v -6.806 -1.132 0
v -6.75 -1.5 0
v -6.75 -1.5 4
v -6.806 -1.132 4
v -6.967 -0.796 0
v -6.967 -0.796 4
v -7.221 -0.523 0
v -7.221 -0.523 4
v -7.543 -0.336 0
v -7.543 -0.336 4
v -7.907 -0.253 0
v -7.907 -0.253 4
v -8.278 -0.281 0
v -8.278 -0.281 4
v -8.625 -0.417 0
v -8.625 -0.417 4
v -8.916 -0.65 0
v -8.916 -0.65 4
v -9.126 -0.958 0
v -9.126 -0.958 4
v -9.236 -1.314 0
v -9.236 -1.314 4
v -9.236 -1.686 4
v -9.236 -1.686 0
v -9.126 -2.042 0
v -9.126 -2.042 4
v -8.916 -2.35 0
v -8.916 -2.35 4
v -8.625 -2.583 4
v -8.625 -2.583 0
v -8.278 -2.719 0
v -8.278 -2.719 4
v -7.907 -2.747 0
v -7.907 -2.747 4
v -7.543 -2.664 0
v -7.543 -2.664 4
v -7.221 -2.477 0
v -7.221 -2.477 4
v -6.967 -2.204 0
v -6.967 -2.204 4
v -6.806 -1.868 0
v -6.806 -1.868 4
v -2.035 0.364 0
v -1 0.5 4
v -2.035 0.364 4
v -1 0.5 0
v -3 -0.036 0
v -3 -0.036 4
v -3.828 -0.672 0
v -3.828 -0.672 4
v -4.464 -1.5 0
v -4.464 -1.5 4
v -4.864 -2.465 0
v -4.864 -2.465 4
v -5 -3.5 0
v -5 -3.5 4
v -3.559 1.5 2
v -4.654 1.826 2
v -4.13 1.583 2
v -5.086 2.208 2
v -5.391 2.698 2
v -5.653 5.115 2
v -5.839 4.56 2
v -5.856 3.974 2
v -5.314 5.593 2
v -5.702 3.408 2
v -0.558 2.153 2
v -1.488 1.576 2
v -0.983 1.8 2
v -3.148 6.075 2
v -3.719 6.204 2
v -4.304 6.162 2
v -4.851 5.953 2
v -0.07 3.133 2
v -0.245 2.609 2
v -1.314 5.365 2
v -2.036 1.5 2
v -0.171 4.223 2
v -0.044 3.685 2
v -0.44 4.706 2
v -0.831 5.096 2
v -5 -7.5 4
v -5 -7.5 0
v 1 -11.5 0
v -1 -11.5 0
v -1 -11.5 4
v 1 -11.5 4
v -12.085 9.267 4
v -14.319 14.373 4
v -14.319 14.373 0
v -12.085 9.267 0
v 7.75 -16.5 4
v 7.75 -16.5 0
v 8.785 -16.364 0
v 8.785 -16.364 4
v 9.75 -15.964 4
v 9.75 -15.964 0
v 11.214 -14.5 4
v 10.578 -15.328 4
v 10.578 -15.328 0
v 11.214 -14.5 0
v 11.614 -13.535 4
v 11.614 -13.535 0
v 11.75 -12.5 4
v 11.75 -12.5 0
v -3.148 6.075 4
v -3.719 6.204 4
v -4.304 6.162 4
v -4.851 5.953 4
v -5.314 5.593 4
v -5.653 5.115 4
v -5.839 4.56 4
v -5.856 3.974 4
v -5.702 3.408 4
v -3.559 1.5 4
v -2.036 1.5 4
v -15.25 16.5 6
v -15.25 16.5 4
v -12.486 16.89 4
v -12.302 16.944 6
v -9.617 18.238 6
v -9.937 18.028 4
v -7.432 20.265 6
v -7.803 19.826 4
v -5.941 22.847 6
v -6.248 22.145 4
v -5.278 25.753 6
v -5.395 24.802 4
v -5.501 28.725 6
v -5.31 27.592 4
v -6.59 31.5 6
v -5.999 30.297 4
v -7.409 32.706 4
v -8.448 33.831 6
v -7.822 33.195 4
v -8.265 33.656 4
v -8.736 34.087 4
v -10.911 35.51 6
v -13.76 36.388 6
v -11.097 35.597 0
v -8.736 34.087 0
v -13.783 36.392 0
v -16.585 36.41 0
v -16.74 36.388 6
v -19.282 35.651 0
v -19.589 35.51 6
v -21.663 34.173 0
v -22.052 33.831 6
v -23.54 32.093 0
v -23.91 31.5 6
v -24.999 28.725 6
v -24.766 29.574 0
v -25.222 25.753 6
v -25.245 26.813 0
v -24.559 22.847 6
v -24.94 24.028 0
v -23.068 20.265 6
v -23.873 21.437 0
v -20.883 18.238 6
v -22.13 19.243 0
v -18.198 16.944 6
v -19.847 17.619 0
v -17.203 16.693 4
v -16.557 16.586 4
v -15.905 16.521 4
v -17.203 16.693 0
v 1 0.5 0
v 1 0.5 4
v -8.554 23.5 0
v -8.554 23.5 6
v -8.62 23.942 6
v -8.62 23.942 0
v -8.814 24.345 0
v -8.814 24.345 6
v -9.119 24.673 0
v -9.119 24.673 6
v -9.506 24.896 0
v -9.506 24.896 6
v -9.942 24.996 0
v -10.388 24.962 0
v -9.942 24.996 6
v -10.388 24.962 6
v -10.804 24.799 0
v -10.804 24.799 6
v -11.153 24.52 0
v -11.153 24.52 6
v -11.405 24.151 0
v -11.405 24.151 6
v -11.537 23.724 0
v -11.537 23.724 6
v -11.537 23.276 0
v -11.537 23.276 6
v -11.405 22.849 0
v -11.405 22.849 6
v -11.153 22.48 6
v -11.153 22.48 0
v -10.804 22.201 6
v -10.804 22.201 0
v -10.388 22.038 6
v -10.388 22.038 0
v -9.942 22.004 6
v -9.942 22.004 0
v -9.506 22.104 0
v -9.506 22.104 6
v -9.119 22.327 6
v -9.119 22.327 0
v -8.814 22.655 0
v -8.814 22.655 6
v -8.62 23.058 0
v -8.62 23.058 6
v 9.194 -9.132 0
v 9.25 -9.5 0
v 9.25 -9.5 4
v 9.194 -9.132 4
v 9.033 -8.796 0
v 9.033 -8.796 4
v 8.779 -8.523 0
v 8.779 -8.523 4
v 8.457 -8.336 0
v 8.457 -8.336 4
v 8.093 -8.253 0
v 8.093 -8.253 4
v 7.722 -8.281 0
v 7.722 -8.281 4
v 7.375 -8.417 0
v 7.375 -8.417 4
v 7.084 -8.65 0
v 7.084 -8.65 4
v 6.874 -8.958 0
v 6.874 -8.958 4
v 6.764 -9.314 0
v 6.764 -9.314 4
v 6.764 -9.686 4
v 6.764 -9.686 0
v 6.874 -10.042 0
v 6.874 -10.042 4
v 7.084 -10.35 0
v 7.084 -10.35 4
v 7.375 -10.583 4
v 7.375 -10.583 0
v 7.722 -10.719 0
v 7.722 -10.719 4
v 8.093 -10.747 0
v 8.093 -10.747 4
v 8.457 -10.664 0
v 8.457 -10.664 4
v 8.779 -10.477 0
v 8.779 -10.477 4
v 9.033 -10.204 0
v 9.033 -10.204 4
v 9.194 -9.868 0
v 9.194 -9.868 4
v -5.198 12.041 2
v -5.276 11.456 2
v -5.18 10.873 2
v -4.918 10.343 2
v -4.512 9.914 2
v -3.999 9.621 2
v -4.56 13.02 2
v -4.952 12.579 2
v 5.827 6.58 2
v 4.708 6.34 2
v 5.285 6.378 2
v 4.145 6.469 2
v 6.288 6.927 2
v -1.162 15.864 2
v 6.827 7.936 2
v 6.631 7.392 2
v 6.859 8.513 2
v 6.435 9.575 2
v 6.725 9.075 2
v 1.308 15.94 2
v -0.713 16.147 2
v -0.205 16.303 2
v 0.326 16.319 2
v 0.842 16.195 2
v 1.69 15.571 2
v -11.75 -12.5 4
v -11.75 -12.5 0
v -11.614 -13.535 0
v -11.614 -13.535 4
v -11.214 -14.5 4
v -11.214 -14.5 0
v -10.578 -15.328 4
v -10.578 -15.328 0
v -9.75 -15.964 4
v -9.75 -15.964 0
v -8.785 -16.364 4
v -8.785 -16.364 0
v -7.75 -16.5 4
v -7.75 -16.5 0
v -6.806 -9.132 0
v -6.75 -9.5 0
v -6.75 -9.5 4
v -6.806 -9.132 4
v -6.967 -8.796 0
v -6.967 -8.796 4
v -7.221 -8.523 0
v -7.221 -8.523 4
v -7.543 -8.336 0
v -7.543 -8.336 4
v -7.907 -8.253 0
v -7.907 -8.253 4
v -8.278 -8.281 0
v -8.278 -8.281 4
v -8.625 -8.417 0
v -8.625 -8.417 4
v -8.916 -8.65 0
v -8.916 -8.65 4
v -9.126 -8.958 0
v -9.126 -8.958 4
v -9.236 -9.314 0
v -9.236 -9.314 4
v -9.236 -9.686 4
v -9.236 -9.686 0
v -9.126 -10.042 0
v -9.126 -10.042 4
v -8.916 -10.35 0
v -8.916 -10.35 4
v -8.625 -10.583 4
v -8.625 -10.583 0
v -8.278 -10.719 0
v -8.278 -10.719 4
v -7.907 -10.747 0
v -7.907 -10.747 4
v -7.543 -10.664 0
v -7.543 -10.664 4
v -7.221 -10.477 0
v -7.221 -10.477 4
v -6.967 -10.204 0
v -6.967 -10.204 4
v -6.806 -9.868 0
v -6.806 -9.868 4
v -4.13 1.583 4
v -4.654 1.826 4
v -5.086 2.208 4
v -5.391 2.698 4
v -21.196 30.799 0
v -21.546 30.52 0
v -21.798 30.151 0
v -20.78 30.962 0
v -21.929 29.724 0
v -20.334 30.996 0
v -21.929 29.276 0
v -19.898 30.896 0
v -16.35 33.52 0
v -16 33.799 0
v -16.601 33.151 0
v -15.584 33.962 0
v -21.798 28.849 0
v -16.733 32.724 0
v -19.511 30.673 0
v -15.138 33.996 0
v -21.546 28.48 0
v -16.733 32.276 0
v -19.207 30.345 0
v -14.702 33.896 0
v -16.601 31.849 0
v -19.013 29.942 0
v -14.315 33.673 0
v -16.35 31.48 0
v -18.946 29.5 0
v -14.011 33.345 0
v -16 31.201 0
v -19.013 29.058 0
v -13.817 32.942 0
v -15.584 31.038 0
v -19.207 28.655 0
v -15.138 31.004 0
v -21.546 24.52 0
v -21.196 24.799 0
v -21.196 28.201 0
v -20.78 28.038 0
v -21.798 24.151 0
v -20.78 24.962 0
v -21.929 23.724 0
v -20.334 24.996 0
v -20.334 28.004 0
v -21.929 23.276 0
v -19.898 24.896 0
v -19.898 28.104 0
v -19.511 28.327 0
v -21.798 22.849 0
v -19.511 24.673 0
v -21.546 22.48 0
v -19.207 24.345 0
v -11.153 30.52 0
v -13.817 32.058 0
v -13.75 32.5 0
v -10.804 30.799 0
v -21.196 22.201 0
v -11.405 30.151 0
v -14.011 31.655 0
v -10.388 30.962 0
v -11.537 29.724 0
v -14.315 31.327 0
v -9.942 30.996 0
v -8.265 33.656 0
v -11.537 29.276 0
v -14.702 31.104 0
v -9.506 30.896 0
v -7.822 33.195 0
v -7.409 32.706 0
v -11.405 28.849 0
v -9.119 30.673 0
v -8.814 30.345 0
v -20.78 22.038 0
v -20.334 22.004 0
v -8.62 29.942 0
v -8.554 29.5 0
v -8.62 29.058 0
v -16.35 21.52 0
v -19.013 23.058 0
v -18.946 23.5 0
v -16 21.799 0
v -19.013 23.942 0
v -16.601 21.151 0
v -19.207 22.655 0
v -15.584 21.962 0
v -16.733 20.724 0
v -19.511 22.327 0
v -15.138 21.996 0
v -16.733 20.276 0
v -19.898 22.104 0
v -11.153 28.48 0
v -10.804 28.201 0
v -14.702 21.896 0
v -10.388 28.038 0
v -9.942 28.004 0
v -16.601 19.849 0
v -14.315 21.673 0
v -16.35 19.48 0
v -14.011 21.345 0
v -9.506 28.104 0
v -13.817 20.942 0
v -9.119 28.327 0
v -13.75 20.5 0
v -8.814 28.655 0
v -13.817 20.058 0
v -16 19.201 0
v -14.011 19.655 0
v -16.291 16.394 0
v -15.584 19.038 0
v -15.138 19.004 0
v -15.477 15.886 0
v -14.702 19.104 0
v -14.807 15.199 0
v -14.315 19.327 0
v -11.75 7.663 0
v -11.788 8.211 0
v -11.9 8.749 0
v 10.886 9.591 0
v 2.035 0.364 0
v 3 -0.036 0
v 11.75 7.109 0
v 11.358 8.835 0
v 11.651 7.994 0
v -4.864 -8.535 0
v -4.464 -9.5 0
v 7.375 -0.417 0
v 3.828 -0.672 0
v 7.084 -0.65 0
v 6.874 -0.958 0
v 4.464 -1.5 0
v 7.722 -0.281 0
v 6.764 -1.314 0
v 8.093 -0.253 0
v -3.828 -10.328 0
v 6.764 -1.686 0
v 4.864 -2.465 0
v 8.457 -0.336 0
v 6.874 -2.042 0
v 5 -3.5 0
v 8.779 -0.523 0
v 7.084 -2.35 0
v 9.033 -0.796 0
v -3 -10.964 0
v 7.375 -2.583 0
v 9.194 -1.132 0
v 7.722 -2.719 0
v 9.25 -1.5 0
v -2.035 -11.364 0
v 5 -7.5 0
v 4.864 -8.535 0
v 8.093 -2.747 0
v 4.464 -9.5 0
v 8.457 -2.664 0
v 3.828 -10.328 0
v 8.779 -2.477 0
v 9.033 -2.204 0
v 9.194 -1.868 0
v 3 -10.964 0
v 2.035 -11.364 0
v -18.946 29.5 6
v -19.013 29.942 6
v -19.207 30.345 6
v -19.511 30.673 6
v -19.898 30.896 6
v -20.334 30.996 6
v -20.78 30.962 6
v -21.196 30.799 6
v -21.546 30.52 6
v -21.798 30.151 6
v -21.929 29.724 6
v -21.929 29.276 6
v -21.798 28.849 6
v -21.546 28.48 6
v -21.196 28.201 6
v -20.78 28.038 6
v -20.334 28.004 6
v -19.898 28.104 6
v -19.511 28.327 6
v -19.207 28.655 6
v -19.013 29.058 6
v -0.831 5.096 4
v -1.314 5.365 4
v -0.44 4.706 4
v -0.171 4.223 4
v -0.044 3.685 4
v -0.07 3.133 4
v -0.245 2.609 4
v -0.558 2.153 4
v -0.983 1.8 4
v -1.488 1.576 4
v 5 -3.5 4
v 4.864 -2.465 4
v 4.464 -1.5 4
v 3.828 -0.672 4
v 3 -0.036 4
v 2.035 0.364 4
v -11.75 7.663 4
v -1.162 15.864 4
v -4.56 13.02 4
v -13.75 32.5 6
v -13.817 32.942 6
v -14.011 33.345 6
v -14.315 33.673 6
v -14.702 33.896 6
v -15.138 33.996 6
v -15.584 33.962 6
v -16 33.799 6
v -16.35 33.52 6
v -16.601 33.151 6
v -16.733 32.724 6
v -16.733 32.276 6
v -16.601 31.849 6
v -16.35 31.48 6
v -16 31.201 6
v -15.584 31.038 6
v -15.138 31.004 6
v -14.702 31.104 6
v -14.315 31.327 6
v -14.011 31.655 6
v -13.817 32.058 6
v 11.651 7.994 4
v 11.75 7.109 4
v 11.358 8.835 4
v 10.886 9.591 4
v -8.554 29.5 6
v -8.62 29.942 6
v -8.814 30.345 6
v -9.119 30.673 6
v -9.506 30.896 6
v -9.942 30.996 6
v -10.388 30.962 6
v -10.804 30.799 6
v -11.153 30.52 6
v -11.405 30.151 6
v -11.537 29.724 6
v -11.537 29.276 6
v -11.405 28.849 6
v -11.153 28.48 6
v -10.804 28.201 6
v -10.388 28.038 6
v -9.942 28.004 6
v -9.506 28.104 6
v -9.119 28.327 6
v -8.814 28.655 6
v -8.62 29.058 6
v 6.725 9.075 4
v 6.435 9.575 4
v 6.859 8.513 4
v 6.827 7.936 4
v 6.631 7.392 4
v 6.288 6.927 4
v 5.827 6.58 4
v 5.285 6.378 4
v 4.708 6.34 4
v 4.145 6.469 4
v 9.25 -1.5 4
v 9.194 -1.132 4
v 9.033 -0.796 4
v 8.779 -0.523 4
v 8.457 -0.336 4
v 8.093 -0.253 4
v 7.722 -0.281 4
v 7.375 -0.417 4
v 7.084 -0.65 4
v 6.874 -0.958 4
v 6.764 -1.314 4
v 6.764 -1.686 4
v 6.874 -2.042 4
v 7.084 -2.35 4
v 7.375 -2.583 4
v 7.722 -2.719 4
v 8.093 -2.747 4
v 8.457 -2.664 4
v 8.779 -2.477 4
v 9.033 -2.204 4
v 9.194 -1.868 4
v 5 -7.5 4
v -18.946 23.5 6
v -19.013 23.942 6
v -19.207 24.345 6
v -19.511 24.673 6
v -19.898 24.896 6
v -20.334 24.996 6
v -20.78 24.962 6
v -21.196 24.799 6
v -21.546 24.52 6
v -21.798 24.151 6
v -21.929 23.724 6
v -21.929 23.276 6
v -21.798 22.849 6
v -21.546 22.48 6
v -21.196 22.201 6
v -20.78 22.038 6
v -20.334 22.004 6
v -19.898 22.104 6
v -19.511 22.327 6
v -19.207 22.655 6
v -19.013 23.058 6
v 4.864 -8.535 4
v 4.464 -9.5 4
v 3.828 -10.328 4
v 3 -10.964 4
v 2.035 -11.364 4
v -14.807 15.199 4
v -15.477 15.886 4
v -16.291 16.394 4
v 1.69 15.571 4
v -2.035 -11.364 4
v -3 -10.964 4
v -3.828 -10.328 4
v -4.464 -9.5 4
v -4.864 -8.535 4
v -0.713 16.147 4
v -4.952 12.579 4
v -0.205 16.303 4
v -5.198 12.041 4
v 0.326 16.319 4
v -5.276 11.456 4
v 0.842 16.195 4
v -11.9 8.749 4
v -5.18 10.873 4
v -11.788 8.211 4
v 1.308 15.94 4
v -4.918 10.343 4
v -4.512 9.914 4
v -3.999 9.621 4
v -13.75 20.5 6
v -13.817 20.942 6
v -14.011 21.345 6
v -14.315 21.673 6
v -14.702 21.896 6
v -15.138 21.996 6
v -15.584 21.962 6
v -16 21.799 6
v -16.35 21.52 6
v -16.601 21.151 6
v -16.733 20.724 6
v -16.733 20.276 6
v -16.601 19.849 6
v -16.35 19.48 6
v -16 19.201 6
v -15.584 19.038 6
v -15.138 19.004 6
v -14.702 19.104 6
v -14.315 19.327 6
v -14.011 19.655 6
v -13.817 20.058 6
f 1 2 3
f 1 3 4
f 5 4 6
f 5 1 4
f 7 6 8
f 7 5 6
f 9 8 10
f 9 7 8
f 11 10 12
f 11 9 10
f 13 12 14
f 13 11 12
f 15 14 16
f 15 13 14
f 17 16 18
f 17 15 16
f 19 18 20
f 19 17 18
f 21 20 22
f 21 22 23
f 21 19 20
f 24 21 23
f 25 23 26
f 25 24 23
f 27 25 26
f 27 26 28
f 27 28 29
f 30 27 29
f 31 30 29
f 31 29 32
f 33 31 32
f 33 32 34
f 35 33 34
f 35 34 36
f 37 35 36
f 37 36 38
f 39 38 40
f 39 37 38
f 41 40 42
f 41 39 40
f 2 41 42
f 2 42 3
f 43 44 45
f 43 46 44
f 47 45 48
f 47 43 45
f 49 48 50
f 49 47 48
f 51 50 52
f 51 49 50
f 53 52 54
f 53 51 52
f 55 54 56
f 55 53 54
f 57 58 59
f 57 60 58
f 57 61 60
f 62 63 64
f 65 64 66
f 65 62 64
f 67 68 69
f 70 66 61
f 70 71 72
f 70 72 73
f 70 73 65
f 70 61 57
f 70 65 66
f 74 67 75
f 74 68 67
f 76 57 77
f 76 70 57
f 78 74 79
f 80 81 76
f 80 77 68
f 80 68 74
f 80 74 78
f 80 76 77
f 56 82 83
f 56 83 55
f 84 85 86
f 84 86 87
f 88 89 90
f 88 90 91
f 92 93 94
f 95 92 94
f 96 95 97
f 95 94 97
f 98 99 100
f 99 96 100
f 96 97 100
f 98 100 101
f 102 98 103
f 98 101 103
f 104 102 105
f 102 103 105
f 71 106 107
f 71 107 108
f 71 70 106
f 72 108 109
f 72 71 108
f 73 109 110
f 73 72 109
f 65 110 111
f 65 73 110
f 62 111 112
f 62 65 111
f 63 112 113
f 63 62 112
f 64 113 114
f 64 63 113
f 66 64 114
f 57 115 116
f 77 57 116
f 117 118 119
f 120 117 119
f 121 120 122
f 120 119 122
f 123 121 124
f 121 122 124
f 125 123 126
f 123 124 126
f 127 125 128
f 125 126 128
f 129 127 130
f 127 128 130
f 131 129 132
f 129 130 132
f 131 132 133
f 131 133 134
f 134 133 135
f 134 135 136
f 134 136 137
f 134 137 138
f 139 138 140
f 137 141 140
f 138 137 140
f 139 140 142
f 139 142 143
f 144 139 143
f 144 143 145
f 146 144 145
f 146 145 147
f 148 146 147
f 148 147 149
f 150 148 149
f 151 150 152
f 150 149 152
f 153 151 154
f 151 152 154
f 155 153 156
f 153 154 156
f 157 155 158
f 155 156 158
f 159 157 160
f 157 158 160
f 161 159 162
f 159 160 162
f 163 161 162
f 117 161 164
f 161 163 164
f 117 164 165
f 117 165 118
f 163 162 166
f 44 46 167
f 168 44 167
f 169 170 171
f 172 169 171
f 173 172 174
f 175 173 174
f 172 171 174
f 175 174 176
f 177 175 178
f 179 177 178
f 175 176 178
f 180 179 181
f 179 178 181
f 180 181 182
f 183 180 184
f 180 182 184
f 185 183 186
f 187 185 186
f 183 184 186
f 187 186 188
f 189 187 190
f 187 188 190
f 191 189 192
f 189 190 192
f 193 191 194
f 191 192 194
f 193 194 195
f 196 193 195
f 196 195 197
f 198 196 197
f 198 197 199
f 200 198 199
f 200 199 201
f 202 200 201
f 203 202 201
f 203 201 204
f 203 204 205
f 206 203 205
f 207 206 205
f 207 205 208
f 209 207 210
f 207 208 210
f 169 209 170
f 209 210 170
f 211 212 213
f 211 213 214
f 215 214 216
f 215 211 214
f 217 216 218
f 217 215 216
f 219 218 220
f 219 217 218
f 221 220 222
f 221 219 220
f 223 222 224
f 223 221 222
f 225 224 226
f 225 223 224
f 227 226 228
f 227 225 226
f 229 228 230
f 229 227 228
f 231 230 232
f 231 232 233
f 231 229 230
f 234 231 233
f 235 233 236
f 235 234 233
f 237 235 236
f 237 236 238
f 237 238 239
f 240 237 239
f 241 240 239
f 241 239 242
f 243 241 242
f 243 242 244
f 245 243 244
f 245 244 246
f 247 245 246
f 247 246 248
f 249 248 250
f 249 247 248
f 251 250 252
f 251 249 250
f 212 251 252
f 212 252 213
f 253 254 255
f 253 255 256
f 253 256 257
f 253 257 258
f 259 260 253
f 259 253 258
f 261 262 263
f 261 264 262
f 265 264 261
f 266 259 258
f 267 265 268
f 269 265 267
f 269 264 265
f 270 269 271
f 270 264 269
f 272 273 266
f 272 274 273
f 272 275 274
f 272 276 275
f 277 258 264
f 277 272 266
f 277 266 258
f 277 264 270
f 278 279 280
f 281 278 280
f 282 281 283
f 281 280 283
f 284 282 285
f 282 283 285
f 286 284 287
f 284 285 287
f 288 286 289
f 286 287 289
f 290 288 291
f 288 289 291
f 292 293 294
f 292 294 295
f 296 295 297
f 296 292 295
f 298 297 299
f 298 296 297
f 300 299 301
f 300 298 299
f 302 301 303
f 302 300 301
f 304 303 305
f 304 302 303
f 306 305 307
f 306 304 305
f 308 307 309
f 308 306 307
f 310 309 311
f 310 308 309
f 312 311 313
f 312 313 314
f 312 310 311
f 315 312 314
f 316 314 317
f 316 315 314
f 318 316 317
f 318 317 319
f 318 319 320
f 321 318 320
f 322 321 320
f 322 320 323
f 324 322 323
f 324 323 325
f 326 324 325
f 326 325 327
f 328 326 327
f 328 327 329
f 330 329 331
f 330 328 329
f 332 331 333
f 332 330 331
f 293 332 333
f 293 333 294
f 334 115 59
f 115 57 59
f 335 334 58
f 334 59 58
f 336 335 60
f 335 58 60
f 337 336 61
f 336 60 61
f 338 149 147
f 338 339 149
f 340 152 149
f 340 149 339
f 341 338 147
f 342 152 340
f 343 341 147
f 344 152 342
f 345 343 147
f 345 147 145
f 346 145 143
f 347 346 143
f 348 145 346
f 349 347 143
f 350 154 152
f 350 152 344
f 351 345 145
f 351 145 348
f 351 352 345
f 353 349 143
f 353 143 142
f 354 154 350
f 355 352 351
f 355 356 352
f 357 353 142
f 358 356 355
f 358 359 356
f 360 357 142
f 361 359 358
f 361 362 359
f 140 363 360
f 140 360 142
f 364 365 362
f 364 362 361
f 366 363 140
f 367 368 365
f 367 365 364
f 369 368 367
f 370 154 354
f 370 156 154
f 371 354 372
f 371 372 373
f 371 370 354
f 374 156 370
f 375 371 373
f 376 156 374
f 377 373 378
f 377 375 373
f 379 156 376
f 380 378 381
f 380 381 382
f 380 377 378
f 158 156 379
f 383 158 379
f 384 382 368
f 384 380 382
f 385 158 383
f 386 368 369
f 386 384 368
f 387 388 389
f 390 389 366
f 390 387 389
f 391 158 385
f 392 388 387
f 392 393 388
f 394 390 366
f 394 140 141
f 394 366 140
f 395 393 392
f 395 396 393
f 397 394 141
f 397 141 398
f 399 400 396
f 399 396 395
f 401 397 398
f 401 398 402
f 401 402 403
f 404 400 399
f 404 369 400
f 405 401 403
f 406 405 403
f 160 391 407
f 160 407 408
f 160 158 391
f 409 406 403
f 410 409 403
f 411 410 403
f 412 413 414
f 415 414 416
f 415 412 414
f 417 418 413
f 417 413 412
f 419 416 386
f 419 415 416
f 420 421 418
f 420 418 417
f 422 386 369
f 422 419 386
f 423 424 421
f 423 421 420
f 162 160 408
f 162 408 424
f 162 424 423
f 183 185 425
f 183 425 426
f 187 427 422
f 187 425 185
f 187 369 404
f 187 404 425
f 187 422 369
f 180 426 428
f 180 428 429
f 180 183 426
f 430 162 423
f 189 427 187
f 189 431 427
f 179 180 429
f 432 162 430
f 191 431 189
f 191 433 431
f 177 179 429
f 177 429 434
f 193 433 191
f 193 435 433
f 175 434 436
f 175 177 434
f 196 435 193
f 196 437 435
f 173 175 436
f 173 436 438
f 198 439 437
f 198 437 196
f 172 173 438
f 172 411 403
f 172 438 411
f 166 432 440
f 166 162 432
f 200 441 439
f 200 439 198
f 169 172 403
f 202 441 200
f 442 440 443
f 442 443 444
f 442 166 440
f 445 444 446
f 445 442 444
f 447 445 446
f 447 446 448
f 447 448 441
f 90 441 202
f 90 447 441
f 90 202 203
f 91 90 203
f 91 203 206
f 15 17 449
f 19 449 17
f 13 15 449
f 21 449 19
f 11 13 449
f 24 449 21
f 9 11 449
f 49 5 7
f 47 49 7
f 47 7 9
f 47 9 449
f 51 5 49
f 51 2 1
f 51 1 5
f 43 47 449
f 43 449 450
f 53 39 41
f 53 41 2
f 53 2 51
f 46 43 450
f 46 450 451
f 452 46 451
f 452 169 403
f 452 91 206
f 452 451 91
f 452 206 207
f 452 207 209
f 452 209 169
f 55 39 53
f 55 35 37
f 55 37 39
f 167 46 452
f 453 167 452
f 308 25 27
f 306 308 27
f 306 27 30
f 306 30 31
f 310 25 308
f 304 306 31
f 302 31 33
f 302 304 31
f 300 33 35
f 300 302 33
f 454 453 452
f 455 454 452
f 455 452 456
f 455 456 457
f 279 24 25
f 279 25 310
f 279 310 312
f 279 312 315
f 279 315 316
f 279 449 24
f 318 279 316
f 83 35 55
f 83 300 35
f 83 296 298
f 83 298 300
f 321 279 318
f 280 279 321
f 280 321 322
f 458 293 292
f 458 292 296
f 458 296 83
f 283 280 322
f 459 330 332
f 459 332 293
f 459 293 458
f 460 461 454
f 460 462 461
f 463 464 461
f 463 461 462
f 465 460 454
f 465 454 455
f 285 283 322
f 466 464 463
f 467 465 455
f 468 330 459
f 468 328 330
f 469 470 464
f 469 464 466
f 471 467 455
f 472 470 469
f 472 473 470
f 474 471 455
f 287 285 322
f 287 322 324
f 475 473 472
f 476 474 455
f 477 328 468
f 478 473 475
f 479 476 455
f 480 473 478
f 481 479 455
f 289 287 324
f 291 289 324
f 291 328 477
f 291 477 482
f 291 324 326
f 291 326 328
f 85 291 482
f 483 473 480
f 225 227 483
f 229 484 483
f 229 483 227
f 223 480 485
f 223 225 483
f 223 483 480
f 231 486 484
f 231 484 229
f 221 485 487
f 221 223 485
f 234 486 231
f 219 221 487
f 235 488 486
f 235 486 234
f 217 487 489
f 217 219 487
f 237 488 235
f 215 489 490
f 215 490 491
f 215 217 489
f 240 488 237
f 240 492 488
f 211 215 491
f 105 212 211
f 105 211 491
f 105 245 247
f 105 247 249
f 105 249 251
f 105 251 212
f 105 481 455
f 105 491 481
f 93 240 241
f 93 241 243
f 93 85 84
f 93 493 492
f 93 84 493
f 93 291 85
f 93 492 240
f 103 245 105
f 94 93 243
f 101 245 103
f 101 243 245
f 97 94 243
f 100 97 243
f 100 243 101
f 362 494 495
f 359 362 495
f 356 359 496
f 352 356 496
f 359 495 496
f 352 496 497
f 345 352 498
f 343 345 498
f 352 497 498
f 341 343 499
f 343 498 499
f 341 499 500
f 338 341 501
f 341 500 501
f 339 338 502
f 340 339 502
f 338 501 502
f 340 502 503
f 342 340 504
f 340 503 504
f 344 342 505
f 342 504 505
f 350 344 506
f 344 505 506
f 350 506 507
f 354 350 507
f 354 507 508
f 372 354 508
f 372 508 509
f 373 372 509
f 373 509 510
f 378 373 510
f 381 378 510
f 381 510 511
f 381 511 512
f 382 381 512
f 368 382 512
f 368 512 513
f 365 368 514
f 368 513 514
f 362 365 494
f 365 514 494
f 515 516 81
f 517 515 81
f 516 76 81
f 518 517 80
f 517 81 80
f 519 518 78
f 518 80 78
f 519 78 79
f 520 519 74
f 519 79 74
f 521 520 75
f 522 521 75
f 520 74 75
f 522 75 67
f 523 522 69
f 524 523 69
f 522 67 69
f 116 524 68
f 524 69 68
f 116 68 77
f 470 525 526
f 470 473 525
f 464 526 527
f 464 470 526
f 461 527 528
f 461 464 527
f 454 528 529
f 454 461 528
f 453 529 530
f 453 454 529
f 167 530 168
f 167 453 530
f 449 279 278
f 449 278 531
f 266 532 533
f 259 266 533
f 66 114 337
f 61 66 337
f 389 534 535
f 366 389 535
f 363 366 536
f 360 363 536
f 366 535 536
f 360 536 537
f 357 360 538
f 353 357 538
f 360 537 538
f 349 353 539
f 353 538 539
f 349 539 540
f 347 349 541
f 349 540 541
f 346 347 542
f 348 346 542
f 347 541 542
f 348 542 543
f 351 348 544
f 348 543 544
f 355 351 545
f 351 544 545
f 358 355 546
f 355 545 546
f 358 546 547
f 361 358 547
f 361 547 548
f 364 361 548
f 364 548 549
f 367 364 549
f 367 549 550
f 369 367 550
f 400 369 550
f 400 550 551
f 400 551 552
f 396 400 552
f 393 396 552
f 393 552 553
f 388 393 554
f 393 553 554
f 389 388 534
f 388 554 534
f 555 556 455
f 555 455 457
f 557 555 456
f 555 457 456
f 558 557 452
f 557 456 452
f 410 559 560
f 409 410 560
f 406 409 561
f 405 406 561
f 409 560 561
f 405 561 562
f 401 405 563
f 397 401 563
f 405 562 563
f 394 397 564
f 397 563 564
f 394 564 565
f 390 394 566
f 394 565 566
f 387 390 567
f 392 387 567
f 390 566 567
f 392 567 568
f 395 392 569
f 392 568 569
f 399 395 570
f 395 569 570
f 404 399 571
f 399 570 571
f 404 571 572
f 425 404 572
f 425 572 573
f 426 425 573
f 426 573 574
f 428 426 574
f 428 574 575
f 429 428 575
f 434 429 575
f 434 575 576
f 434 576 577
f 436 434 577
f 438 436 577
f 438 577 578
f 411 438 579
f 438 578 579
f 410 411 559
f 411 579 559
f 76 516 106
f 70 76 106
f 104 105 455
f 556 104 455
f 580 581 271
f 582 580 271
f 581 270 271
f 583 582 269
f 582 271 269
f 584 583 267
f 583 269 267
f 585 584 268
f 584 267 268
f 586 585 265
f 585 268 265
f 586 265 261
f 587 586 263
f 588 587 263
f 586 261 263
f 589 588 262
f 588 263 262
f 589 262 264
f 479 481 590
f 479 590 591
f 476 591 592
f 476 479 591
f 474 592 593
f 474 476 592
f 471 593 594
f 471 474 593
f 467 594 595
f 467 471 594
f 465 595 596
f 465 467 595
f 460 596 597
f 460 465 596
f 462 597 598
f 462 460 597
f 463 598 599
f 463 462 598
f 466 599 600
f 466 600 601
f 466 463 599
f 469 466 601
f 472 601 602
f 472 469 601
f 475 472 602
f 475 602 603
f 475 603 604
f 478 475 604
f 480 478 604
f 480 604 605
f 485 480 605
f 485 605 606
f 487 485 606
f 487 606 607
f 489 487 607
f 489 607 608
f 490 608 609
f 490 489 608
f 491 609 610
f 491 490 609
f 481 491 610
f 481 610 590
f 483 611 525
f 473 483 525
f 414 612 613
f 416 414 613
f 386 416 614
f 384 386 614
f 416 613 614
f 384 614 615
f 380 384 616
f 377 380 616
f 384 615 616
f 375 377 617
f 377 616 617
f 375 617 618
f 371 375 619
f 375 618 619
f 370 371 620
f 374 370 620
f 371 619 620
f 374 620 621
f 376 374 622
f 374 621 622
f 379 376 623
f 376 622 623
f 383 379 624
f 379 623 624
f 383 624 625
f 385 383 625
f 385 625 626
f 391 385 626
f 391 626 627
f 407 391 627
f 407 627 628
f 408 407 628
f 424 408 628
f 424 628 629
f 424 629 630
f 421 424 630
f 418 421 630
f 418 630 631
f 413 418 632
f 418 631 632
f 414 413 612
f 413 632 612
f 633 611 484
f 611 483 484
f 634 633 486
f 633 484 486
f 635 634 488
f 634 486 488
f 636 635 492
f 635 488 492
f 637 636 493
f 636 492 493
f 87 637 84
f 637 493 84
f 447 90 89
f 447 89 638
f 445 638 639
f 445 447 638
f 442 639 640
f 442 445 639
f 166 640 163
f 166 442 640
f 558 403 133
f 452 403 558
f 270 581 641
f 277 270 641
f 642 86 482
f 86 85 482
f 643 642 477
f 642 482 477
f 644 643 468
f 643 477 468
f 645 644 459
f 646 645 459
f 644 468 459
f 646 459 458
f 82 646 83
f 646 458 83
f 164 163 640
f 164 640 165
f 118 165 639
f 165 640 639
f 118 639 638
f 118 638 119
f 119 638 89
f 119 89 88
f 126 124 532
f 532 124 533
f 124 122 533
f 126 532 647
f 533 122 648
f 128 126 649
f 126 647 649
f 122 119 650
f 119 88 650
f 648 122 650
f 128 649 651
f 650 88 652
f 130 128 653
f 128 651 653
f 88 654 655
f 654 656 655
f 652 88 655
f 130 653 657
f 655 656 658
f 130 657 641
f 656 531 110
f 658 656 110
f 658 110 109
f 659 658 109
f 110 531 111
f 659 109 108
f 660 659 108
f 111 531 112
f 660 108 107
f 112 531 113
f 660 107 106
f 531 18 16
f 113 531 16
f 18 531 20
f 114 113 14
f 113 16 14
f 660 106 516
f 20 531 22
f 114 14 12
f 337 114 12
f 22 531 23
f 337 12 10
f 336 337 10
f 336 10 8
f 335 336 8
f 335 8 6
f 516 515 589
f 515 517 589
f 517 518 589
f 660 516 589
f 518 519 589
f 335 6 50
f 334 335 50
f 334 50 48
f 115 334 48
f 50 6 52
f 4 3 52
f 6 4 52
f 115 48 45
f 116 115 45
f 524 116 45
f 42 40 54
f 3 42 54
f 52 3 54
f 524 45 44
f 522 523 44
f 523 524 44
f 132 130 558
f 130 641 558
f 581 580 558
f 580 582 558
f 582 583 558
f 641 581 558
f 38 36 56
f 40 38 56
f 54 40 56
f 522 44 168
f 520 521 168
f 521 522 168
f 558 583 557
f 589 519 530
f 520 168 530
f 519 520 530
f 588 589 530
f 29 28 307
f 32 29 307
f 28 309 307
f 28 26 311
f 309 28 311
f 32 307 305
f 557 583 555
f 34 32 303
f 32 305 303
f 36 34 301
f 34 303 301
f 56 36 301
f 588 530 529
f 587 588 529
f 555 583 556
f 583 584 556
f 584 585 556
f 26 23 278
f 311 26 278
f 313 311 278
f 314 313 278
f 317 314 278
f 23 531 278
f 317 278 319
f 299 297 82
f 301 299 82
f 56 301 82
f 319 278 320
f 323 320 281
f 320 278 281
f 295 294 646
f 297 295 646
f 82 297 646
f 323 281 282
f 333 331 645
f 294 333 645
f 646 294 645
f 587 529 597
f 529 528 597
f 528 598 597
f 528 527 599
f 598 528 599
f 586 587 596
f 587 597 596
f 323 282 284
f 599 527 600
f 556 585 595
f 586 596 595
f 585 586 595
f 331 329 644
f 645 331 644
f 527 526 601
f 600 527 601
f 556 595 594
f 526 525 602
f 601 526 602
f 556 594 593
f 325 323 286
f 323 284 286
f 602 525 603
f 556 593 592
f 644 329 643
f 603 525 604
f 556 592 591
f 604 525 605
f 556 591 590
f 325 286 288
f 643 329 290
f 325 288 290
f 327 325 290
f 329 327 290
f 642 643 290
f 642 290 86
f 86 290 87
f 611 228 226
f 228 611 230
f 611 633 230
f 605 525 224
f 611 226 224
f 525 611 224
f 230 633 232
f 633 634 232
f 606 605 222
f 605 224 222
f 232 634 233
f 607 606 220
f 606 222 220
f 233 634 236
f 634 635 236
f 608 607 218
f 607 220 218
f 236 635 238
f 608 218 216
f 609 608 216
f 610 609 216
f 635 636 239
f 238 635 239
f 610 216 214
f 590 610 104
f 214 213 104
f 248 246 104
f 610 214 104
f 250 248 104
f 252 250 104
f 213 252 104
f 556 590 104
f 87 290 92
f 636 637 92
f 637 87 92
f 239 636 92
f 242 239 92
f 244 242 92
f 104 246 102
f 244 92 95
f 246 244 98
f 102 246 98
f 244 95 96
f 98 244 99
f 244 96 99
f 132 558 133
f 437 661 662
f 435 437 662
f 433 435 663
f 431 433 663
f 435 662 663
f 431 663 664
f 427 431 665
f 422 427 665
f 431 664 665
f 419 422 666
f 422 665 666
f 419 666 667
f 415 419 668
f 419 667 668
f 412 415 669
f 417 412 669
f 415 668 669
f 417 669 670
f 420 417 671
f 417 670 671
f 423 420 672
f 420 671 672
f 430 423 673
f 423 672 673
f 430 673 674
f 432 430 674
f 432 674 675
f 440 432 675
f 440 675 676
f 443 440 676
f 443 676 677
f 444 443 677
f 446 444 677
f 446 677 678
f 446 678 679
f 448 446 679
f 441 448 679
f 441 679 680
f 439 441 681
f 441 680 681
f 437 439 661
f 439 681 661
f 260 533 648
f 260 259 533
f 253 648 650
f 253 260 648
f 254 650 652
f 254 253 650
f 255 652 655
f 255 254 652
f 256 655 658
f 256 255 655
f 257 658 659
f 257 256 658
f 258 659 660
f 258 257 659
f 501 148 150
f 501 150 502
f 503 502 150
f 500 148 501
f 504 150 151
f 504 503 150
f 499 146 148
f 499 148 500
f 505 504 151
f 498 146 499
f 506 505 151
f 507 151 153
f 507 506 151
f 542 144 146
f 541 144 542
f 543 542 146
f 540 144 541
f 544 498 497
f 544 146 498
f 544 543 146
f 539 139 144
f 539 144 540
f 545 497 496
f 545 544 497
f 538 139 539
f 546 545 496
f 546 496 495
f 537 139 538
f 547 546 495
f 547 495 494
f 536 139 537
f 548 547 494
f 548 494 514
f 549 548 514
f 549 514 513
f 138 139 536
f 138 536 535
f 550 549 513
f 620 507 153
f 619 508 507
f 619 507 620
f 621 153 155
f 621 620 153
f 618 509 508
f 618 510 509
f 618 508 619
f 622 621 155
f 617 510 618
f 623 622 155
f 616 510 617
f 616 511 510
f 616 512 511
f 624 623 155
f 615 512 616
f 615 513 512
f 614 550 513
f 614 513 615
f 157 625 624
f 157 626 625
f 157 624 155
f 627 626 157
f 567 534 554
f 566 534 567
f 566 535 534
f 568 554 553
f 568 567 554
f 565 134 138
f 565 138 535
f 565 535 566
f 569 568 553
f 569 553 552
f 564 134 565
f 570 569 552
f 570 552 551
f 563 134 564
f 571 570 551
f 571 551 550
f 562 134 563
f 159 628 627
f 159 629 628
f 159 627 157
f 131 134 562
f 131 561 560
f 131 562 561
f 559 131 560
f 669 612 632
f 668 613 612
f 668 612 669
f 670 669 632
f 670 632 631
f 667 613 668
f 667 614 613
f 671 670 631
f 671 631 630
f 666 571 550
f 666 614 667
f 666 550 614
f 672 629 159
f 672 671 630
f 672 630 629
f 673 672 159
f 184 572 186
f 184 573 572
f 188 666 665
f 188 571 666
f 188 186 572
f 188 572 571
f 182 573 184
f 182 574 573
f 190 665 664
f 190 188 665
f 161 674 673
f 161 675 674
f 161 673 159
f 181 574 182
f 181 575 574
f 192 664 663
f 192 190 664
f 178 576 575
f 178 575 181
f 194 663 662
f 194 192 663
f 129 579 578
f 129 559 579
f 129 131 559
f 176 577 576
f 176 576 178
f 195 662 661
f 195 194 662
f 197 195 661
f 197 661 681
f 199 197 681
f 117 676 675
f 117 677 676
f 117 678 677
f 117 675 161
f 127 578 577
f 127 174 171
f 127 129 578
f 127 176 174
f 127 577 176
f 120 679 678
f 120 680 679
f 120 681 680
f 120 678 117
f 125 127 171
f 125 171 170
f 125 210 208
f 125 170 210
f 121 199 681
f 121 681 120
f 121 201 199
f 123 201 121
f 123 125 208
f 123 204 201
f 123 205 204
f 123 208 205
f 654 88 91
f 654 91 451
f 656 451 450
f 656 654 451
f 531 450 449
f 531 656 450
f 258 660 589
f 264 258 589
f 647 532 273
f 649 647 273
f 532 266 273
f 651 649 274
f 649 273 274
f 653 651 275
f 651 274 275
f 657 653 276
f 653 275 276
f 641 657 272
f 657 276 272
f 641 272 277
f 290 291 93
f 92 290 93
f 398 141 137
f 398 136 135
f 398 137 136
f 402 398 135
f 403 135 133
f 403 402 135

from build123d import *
from build123d.topology import SkipClean

# Parameters (mm, degrees)
SKETCH_1_R          = 10
SKETCH_1_W          = 23.5
SKETCH_1_H          = 33
SKETCH_1_R_2        = 1.25
EXTRUDE_1_DEPTH     = 4
SKETCH_2_R          = 10
EXTRUDE_2_DEPTH     = 2
SKETCH_3_R          = 1.5
CUT_EXTRUDE_1_DEPTH = 6
SKETCH_4_W          = 10
SKETCH_4_H          = 12
CUT_EXTRUDE_2_DEPTH = 6
CUT_EXTRUDE_START   = -10
CUT_EXTRUDE_4_DEPTH = 10
EXTRUDE_4_DEPTH     = 4
FILLET_1_R          = 4
CUT_EXTRUDE_5_DEPTH = 2
FILLET_2_R          = 2
FILLET_3_R          = 4


with BuildPart() as part:
    # 草图1 → 凸台-拉伸1 (new body)
    # profile 1 of 3: a face of its own
    with BuildSketch(Plane.XY):
        with Locations((-15.25, 26.5)):
            Circle(SKETCH_1_R)
    # profile 2 of 3: a face of its own
    with BuildSketch(Plane.XY):
        with BuildLine():
            Line((-15.25, 16.5), (-11.75, 16.5))
            Line((-11.75, 16.5), (11.75, 16.5))
            Line((11.75, 16.5), (-8.736127865, 34.087454765))
            ThreePointArc((-8.736127865, 34.087454765), (-6.16323156, 30.675001716), (-5.25, 26.5))
            ThreePointArc((-5.25, 26.5), (-8.178932188, 19.428932188), (-15.25, 16.5))
        make_face()
    # profile 3 of 3: a face of its own
    with BuildSketch(Plane.XY):
        Rectangle(SKETCH_1_W, SKETCH_1_H)
        with Locations((-8, -1.5)):
            Circle(SKETCH_1_R_2, mode=Mode.SUBTRACT)
        with Locations((-8, -9.5)):
            Circle(SKETCH_1_R_2, mode=Mode.SUBTRACT)
        with Locations((8, -9.5)):
            Circle(SKETCH_1_R_2, mode=Mode.SUBTRACT)
        with Locations((8, -1.5)):
            Circle(SKETCH_1_R_2, mode=Mode.SUBTRACT)
    extrude(amount=EXTRUDE_1_DEPTH)

    # 草图2 → 凸台-拉伸2 (add)
    with BuildSketch(Plane.XY.offset(4)):
        with Locations(Location((-15.25, 26.5, 0), (0, 0, 270))):
            Circle(SKETCH_2_R)
    extrude(amount=EXTRUDE_2_DEPTH)

    # 草图3 → 切除-拉伸1 (cut)
    with BuildSketch(Plane.XY.offset(6)):
        with Locations((-15.25, 32.5)):
            Circle(SKETCH_3_R)
        with Locations((-10.053847577, 29.5)):
            Circle(SKETCH_3_R)
        with Locations((-10.053847577, 23.5)):
            Circle(SKETCH_3_R)
        with Locations((-15.25, 20.5)):
            Circle(SKETCH_3_R)
        with Locations((-20.446152423, 23.5)):
            Circle(SKETCH_3_R)
        with Locations((-20.446152423, 29.5)):
            Circle(SKETCH_3_R)
    extrude(amount=-CUT_EXTRUDE_1_DEPTH, mode=Mode.SUBTRACT)

    # 草图4 → 切除-拉伸2 (cut)
    with BuildSketch(Plane.XY.offset(4)):
        with Locations((0, -5.5)):
            Rectangle(SKETCH_4_W, SKETCH_4_H)
    extrude(amount=-CUT_EXTRUDE_2_DEPTH, mode=Mode.SUBTRACT)

    # 草图7 → 切除-拉伸4 (cut)
    with SkipClean():  # the faces are left unmerged after this step: merging them gives an invalid solid
        with BuildSketch(Plane.XY.offset(4).offset(CUT_EXTRUDE_START)):
            with BuildLine():
                Line((-7.408855029, 32.706161901), (11.75, 8.5))
                Line((11.75, 8.5), (11.75, 16.5))
                Line((11.75, 16.5), (-8.736127865, 34.087454765))
                ThreePointArc((-8.736127865, 34.087454765), (-8.03933973, 33.428663542), (-7.408855029, 32.706161901))
            make_face()
        extrude(amount=CUT_EXTRUDE_4_DEPTH, mode=Mode.SUBTRACT)

    # 草图8 → 凸台-拉伸4 (add)
    with SkipClean():  # the faces are left unmerged after this step: merging them gives an invalid solid
        with BuildSketch(Plane.XY.offset(4)):
            Polygon((-15.25, 16.5), (-11.75, 8.5), (-11.75, 16.5), align=None)
        extrude(amount=-EXTRUDE_4_DEPTH)

    # 圆角1
    # the kernel refuses this fillet: 4 mm, written as the material it adds along each edge
    with BuildSketch(Plane(origin=(-11.75, 8.5, 4), x_dir=(-0.4008188340197085, 0.9161573349021888, 0), z_dir=(0, 0, -1))) as fillet_1_piece_1:
        with BuildLine():
            CenterArc((FILLET_1_R * 0.209178456653, -FILLET_1_R), FILLET_1_R, 90, 23.629377731)
            Line((-FILLET_1_R * 0.191640377366, -FILLET_1_R * 0.0838426650978), (0, 0))
            Line((0, 0), (FILLET_1_R * 0.209178456653, 0))
        make_face()
    extrude(amount=4)
    with BuildSketch(Plane(origin=(-15.25, 16.5, 0), x_dir=(-0.9951749946983144, 0.09811590048106404, 0), z_dir=(0, 0, 1))) as fillet_1_piece_2:
        with BuildLine():
            CenterArc((2.354781612, 3.980699979), FILLET_1_R, 209.260063678, 55.109250376)
            Line((-1.134859069, 2.025602047), (0, 0))
            ThreePointArc((0, 0), (0.981159005, 0.048250053), (1.96231801, 0))
        make_face()
    extrude(amount=4)
    # the kernel refuses this fillet: 4 mm, written as the material it takes off along each edge
    with BuildSketch(Plane(origin=(11.75, -16.5, -10), x_dir=(0, 1, 0), z_dir=(0, 0, 1)), Plane(origin=(-11.75, -16.5, -10), x_dir=(1, 0, 0), z_dir=(0, 0, 1))) as fillet_1_2_piece_1:
        with BuildLine():
            CenterArc((FILLET_1_R, FILLET_1_R), FILLET_1_R, 180, 90)
            Line((0, FILLET_1_R), (0, 0))
            Line((0, 0), (FILLET_1_R, 0))
        make_face()
    extrude(amount=24, mode=Mode.SUBTRACT)
    with BuildSketch(Plane(origin=(11.75, 8.5, -3.478567049), x_dir=(-0.6206161901076825, 0.7841144971088245, 0), z_dir=(0, 0, 1))) as fillet_1_2_piece_2:
        with BuildLine():
            CenterArc((FILLET_1_R * 0.347856704888, FILLET_1_R), FILLET_1_R, 231.638854085, 38.361145915)
            Line((-FILLET_1_R * 0.272759485219, FILLET_1_R * 0.215885502891), (0, 0))
            Line((0, 0), (FILLET_1_R * 0.347856704888, 0))
        make_face()
    extrude(amount=10.957134098, mode=Mode.SUBTRACT)

    # 草图9 → 切除-拉伸5 (cut)
    with BuildSketch(Plane.XY.offset(4)):
        Polygon((-7.627398855, 7.809036267), (-4.867195488, 1.5), (8.671465121, 1.5), align=None)
        Polygon((-7.160168155, 10.845088414), (10.991392982, 3.818901946), (0.414449212, 17.182289942), align=None)
    extrude(amount=-CUT_EXTRUDE_5_DEPTH, mode=Mode.SUBTRACT)

    # 圆角2
    fillet_2_edges = [part.edges().sort_by_distance(p)[0] for p in [
        (-7.160168155, 10.845088414, 3),
        (0.414449212, 17.182289942, 3),
        (10.991392982, 3.818901946, 3),
        (8.671465121, 1.5, 3),
        (-4.867195488, 1.5, 3),
        (-7.627398855, 7.809036267, 3),
    ]]
    fillet(fillet_2_edges, radius=FILLET_2_R)

    # 圆角3
    fillet_3_edges = [part.edges().sort_by_distance(p)[0] for p in [
        (5, 0.5, 2),
        (5, -11.5, 2),
        (-5, -11.5, 2),
        (-5, 0.5, 2),
    ]]
    fillet(fillet_3_edges, radius=FILLET_3_R)


solid = part.part
